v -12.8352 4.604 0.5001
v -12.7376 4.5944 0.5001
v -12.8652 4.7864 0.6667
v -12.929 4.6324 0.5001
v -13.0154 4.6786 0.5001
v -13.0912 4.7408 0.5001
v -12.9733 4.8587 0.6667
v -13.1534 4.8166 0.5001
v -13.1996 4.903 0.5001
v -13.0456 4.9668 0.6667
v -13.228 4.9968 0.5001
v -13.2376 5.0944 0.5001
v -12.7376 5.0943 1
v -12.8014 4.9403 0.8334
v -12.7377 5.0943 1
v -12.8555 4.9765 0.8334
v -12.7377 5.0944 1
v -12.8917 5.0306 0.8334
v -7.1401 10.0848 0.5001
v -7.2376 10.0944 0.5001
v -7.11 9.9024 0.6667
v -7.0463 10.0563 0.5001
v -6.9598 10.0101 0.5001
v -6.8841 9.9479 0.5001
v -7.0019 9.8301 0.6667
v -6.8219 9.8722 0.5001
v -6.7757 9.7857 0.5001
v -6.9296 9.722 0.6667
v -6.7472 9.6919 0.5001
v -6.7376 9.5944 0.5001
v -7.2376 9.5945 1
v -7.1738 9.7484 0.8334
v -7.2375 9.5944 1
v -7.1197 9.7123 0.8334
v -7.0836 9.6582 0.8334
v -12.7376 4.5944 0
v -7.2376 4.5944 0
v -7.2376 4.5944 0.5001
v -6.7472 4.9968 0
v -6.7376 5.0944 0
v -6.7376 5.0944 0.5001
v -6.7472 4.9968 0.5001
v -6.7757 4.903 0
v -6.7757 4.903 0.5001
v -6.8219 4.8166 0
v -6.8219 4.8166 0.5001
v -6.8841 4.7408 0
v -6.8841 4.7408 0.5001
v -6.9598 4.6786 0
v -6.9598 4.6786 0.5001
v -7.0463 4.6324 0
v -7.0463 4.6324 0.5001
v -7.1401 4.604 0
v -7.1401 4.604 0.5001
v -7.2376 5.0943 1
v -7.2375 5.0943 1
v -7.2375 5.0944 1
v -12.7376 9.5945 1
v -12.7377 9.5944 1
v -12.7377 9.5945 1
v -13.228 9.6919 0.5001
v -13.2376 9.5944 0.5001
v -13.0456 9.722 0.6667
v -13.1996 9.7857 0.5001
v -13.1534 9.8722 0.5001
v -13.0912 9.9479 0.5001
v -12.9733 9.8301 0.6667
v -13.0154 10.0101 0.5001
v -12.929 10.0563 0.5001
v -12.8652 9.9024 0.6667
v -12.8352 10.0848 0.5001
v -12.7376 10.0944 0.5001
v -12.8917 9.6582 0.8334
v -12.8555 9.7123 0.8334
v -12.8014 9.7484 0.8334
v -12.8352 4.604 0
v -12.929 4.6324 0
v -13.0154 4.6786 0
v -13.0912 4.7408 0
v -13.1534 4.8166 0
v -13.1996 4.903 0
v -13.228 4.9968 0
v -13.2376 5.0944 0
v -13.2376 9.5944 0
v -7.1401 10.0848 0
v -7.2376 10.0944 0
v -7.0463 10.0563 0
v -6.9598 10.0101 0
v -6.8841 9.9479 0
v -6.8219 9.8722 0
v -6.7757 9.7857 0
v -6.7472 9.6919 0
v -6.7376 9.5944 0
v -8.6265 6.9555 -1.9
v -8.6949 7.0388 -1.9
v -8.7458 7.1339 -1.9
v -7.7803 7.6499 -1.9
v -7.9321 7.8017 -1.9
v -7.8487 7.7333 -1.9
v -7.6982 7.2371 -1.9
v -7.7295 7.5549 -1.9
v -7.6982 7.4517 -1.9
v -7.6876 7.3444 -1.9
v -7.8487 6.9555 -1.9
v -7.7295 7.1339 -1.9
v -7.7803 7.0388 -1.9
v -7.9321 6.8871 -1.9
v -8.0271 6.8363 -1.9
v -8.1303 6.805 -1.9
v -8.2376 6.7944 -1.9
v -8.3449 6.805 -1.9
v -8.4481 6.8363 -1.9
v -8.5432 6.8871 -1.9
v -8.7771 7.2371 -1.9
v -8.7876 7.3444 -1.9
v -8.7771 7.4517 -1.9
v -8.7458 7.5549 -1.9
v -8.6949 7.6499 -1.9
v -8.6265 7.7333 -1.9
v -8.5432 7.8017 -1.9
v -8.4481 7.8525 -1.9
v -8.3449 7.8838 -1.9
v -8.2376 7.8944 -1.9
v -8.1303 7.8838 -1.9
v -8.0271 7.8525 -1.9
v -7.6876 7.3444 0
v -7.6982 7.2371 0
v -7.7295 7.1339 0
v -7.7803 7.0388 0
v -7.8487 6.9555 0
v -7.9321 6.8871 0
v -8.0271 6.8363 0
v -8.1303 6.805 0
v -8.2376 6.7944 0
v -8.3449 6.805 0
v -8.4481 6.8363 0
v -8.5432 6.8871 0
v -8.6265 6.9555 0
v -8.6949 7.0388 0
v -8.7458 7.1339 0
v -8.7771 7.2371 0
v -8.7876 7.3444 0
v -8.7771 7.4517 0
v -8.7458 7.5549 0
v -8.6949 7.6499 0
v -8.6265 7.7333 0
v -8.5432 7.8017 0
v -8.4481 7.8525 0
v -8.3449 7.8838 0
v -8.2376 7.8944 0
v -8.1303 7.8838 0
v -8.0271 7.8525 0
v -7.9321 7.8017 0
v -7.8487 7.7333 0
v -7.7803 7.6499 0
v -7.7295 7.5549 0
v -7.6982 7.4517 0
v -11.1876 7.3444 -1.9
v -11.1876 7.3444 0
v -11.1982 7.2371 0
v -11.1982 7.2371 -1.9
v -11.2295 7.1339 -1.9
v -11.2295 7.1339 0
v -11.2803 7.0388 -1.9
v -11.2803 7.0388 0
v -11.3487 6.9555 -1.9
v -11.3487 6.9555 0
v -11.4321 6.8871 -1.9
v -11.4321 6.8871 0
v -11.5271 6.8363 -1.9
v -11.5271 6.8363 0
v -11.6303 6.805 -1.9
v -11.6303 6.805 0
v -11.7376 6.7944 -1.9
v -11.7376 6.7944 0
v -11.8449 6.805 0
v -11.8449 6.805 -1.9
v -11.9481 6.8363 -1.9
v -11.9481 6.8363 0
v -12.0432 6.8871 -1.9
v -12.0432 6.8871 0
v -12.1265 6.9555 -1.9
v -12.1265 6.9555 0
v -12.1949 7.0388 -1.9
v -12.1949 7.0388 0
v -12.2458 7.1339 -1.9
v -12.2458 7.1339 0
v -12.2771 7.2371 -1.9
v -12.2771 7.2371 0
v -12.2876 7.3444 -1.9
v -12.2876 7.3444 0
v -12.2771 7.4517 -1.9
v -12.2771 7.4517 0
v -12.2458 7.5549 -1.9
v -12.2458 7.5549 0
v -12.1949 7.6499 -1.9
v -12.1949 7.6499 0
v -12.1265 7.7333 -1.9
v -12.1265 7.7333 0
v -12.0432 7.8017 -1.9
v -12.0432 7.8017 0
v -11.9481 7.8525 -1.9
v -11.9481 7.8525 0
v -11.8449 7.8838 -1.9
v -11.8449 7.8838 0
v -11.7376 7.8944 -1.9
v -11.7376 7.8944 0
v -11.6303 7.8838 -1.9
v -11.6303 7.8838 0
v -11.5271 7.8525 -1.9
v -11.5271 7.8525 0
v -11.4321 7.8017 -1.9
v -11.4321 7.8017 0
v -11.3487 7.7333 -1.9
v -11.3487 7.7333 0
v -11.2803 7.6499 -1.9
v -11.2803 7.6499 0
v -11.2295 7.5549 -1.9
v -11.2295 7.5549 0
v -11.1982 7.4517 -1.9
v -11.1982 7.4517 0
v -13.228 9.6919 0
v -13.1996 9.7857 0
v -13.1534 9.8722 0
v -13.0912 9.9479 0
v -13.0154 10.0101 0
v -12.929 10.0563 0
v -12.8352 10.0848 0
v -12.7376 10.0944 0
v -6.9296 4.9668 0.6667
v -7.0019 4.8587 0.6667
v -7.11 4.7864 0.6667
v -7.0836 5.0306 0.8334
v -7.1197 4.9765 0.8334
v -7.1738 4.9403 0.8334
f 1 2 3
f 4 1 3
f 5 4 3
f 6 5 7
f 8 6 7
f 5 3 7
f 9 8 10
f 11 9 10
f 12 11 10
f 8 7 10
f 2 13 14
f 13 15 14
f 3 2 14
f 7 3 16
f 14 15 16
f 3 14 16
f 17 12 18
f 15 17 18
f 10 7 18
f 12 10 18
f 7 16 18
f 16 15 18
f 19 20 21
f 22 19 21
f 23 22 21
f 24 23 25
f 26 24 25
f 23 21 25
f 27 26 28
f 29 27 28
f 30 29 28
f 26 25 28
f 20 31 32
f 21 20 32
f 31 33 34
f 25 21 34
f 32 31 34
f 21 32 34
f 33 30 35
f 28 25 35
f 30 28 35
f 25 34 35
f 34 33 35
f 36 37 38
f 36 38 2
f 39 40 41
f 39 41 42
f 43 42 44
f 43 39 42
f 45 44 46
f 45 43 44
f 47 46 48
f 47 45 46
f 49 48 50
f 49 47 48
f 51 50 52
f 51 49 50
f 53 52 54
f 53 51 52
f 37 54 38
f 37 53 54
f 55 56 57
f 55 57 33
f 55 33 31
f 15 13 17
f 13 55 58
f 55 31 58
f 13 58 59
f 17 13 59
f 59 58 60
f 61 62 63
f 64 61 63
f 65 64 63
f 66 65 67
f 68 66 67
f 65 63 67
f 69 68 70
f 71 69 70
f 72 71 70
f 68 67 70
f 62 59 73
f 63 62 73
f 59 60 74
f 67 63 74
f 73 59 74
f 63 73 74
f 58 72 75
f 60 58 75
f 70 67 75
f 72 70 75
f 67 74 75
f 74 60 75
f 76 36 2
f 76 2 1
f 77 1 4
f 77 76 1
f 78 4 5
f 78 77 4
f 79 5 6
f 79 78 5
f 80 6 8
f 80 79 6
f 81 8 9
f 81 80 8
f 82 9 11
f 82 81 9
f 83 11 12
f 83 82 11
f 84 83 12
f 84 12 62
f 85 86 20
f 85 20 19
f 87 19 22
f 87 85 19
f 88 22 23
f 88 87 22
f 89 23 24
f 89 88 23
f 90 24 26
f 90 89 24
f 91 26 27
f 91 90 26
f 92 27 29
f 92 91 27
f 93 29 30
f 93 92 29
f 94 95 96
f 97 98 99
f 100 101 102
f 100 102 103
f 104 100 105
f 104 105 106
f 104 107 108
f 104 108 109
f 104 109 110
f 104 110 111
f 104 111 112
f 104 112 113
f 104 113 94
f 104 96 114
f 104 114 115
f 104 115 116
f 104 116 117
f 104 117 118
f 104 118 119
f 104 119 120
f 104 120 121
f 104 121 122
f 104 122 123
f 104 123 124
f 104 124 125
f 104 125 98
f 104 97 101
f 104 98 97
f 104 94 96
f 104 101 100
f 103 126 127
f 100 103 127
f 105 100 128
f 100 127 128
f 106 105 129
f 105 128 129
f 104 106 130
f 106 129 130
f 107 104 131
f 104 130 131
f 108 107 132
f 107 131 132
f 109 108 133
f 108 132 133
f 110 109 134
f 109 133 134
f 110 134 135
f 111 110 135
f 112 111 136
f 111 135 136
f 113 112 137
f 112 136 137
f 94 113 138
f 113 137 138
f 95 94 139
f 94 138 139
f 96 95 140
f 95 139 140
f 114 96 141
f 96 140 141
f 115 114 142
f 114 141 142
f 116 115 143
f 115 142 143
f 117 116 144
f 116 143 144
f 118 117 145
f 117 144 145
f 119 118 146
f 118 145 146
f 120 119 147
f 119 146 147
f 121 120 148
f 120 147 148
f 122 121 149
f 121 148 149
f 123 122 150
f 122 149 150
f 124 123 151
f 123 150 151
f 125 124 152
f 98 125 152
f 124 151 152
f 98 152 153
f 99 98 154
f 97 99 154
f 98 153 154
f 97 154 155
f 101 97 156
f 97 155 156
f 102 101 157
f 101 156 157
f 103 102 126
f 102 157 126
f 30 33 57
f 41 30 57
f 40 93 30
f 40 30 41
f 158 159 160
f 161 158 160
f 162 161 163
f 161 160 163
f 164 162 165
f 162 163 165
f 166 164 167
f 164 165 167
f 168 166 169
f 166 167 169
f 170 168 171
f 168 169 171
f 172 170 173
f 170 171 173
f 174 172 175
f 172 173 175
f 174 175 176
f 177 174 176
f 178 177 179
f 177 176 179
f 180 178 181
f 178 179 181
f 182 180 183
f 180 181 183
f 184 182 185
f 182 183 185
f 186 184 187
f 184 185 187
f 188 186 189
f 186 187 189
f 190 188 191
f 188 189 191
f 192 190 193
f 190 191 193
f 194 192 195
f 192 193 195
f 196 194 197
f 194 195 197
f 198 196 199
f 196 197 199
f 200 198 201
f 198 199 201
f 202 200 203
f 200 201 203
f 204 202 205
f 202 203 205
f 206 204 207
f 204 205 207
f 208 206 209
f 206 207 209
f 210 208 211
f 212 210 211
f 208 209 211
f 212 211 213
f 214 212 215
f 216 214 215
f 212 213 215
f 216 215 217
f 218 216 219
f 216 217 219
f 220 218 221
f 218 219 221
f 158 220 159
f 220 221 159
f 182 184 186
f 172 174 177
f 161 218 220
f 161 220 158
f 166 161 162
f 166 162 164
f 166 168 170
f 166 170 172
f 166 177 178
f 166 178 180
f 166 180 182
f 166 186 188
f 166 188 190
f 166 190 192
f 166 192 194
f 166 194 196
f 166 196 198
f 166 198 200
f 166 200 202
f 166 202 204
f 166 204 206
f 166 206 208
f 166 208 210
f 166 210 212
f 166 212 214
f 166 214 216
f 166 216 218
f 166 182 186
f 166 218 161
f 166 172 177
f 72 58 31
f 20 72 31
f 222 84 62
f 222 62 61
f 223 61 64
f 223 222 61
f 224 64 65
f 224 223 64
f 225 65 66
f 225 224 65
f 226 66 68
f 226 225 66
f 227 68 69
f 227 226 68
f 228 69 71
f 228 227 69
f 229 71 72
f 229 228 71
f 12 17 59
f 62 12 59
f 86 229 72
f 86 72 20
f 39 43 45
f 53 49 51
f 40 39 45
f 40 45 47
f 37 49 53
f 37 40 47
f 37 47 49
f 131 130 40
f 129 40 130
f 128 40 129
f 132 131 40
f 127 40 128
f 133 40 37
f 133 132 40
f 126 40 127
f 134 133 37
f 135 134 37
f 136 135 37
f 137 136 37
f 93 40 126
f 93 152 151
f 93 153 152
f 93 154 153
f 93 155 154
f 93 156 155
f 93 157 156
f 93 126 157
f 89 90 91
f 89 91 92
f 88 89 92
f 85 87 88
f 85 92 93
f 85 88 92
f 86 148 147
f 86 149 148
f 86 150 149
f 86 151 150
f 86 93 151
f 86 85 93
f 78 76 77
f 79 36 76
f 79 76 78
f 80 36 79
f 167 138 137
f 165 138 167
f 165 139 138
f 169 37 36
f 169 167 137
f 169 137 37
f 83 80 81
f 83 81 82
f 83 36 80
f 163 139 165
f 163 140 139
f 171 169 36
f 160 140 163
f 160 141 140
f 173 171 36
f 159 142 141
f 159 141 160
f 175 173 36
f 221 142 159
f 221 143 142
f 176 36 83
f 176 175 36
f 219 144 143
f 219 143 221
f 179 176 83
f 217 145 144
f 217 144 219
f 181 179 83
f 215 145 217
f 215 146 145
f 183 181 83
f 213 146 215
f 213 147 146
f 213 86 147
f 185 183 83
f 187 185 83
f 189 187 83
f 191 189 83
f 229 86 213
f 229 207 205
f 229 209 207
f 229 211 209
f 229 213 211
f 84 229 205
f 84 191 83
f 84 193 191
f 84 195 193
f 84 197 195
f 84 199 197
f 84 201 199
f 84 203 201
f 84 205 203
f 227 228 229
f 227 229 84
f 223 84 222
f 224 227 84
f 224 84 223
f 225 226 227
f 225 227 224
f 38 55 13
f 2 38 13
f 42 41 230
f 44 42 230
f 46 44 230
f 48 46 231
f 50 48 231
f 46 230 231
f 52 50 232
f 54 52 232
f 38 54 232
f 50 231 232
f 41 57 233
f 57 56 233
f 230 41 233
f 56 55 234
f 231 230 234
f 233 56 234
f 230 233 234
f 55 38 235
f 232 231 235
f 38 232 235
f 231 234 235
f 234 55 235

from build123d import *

# Parameters (mm, degrees)
EXTRUDE_1_DEPTH = 1
CHAMFER_1_SIZE  = 0.5
SKETCH_2_R      = 0.55
EXTRUDE_2_DEPTH = 1.9


with BuildPart() as part:
    # 草图1 → 凸台-拉伸1 (new body)
    with BuildSketch(Plane.XY):
        with BuildLine():
            Line((-7.237622799, 4.594383921), (-12.737622799, 4.594383921))
            ThreePointArc((-12.737622799, 4.594383921), (-13.091176189, 4.74083053), (-13.237622799, 5.094383921))
            Line((-13.237622799, 5.094383921), (-13.237622799, 9.594383921))
            ThreePointArc((-13.237622799, 9.594383921), (-13.091176189, 9.947937312), (-12.737622799, 10.094383921))
            Line((-12.737622799, 10.094383921), (-7.237622799, 10.094383921))
            ThreePointArc((-7.237622799, 10.094383921), (-6.884069408, 9.947937312), (-6.737622799, 9.594383921))
            Line((-6.737622799, 9.594383921), (-6.737622799, 5.094383921))
            ThreePointArc((-6.737622799, 5.094383921), (-6.884069408, 4.74083053), (-7.237622799, 4.594383921))
        make_face()
    extrude(amount=EXTRUDE_1_DEPTH)

    # 倒角1
    chamfer_1_edges = [part.edges().sort_by_distance(p)[0] for p in [
        (-13.091176189, 9.947937312, 1),
        (-13.237622799, 7.344383921, 1),
        (-13.091176189, 4.74083053, 1),
        (-9.987622799, 4.594383921, 1),
        (-6.884069408, 4.74083053, 1),
        (-6.737622799, 7.344383921, 1),
        (-6.884069408, 9.947937312, 1),
        (-9.987622799, 10.094383921, 1),
    ]]
    chamfer(chamfer_1_edges, length=CHAMFER_1_SIZE - 0.0001)  # a hair under: the kernel refuses the full size

    # 草图2 → 凸台-拉伸2 (add)
    with BuildSketch(Plane(origin=(0, 0, 0), x_dir=(-1, 0, 0), z_dir=(0, 0, -1))):
        with Locations(Location((11.737622799, 7.344383921, 0), (0, 0, 180))):
            Circle(SKETCH_2_R)
        with Locations(Location((8.237622799, 7.344383921, 0), (0, 0, 180))):
            Circle(SKETCH_2_R)
    extrude(amount=EXTRUDE_2_DEPTH)


solid = part.part
